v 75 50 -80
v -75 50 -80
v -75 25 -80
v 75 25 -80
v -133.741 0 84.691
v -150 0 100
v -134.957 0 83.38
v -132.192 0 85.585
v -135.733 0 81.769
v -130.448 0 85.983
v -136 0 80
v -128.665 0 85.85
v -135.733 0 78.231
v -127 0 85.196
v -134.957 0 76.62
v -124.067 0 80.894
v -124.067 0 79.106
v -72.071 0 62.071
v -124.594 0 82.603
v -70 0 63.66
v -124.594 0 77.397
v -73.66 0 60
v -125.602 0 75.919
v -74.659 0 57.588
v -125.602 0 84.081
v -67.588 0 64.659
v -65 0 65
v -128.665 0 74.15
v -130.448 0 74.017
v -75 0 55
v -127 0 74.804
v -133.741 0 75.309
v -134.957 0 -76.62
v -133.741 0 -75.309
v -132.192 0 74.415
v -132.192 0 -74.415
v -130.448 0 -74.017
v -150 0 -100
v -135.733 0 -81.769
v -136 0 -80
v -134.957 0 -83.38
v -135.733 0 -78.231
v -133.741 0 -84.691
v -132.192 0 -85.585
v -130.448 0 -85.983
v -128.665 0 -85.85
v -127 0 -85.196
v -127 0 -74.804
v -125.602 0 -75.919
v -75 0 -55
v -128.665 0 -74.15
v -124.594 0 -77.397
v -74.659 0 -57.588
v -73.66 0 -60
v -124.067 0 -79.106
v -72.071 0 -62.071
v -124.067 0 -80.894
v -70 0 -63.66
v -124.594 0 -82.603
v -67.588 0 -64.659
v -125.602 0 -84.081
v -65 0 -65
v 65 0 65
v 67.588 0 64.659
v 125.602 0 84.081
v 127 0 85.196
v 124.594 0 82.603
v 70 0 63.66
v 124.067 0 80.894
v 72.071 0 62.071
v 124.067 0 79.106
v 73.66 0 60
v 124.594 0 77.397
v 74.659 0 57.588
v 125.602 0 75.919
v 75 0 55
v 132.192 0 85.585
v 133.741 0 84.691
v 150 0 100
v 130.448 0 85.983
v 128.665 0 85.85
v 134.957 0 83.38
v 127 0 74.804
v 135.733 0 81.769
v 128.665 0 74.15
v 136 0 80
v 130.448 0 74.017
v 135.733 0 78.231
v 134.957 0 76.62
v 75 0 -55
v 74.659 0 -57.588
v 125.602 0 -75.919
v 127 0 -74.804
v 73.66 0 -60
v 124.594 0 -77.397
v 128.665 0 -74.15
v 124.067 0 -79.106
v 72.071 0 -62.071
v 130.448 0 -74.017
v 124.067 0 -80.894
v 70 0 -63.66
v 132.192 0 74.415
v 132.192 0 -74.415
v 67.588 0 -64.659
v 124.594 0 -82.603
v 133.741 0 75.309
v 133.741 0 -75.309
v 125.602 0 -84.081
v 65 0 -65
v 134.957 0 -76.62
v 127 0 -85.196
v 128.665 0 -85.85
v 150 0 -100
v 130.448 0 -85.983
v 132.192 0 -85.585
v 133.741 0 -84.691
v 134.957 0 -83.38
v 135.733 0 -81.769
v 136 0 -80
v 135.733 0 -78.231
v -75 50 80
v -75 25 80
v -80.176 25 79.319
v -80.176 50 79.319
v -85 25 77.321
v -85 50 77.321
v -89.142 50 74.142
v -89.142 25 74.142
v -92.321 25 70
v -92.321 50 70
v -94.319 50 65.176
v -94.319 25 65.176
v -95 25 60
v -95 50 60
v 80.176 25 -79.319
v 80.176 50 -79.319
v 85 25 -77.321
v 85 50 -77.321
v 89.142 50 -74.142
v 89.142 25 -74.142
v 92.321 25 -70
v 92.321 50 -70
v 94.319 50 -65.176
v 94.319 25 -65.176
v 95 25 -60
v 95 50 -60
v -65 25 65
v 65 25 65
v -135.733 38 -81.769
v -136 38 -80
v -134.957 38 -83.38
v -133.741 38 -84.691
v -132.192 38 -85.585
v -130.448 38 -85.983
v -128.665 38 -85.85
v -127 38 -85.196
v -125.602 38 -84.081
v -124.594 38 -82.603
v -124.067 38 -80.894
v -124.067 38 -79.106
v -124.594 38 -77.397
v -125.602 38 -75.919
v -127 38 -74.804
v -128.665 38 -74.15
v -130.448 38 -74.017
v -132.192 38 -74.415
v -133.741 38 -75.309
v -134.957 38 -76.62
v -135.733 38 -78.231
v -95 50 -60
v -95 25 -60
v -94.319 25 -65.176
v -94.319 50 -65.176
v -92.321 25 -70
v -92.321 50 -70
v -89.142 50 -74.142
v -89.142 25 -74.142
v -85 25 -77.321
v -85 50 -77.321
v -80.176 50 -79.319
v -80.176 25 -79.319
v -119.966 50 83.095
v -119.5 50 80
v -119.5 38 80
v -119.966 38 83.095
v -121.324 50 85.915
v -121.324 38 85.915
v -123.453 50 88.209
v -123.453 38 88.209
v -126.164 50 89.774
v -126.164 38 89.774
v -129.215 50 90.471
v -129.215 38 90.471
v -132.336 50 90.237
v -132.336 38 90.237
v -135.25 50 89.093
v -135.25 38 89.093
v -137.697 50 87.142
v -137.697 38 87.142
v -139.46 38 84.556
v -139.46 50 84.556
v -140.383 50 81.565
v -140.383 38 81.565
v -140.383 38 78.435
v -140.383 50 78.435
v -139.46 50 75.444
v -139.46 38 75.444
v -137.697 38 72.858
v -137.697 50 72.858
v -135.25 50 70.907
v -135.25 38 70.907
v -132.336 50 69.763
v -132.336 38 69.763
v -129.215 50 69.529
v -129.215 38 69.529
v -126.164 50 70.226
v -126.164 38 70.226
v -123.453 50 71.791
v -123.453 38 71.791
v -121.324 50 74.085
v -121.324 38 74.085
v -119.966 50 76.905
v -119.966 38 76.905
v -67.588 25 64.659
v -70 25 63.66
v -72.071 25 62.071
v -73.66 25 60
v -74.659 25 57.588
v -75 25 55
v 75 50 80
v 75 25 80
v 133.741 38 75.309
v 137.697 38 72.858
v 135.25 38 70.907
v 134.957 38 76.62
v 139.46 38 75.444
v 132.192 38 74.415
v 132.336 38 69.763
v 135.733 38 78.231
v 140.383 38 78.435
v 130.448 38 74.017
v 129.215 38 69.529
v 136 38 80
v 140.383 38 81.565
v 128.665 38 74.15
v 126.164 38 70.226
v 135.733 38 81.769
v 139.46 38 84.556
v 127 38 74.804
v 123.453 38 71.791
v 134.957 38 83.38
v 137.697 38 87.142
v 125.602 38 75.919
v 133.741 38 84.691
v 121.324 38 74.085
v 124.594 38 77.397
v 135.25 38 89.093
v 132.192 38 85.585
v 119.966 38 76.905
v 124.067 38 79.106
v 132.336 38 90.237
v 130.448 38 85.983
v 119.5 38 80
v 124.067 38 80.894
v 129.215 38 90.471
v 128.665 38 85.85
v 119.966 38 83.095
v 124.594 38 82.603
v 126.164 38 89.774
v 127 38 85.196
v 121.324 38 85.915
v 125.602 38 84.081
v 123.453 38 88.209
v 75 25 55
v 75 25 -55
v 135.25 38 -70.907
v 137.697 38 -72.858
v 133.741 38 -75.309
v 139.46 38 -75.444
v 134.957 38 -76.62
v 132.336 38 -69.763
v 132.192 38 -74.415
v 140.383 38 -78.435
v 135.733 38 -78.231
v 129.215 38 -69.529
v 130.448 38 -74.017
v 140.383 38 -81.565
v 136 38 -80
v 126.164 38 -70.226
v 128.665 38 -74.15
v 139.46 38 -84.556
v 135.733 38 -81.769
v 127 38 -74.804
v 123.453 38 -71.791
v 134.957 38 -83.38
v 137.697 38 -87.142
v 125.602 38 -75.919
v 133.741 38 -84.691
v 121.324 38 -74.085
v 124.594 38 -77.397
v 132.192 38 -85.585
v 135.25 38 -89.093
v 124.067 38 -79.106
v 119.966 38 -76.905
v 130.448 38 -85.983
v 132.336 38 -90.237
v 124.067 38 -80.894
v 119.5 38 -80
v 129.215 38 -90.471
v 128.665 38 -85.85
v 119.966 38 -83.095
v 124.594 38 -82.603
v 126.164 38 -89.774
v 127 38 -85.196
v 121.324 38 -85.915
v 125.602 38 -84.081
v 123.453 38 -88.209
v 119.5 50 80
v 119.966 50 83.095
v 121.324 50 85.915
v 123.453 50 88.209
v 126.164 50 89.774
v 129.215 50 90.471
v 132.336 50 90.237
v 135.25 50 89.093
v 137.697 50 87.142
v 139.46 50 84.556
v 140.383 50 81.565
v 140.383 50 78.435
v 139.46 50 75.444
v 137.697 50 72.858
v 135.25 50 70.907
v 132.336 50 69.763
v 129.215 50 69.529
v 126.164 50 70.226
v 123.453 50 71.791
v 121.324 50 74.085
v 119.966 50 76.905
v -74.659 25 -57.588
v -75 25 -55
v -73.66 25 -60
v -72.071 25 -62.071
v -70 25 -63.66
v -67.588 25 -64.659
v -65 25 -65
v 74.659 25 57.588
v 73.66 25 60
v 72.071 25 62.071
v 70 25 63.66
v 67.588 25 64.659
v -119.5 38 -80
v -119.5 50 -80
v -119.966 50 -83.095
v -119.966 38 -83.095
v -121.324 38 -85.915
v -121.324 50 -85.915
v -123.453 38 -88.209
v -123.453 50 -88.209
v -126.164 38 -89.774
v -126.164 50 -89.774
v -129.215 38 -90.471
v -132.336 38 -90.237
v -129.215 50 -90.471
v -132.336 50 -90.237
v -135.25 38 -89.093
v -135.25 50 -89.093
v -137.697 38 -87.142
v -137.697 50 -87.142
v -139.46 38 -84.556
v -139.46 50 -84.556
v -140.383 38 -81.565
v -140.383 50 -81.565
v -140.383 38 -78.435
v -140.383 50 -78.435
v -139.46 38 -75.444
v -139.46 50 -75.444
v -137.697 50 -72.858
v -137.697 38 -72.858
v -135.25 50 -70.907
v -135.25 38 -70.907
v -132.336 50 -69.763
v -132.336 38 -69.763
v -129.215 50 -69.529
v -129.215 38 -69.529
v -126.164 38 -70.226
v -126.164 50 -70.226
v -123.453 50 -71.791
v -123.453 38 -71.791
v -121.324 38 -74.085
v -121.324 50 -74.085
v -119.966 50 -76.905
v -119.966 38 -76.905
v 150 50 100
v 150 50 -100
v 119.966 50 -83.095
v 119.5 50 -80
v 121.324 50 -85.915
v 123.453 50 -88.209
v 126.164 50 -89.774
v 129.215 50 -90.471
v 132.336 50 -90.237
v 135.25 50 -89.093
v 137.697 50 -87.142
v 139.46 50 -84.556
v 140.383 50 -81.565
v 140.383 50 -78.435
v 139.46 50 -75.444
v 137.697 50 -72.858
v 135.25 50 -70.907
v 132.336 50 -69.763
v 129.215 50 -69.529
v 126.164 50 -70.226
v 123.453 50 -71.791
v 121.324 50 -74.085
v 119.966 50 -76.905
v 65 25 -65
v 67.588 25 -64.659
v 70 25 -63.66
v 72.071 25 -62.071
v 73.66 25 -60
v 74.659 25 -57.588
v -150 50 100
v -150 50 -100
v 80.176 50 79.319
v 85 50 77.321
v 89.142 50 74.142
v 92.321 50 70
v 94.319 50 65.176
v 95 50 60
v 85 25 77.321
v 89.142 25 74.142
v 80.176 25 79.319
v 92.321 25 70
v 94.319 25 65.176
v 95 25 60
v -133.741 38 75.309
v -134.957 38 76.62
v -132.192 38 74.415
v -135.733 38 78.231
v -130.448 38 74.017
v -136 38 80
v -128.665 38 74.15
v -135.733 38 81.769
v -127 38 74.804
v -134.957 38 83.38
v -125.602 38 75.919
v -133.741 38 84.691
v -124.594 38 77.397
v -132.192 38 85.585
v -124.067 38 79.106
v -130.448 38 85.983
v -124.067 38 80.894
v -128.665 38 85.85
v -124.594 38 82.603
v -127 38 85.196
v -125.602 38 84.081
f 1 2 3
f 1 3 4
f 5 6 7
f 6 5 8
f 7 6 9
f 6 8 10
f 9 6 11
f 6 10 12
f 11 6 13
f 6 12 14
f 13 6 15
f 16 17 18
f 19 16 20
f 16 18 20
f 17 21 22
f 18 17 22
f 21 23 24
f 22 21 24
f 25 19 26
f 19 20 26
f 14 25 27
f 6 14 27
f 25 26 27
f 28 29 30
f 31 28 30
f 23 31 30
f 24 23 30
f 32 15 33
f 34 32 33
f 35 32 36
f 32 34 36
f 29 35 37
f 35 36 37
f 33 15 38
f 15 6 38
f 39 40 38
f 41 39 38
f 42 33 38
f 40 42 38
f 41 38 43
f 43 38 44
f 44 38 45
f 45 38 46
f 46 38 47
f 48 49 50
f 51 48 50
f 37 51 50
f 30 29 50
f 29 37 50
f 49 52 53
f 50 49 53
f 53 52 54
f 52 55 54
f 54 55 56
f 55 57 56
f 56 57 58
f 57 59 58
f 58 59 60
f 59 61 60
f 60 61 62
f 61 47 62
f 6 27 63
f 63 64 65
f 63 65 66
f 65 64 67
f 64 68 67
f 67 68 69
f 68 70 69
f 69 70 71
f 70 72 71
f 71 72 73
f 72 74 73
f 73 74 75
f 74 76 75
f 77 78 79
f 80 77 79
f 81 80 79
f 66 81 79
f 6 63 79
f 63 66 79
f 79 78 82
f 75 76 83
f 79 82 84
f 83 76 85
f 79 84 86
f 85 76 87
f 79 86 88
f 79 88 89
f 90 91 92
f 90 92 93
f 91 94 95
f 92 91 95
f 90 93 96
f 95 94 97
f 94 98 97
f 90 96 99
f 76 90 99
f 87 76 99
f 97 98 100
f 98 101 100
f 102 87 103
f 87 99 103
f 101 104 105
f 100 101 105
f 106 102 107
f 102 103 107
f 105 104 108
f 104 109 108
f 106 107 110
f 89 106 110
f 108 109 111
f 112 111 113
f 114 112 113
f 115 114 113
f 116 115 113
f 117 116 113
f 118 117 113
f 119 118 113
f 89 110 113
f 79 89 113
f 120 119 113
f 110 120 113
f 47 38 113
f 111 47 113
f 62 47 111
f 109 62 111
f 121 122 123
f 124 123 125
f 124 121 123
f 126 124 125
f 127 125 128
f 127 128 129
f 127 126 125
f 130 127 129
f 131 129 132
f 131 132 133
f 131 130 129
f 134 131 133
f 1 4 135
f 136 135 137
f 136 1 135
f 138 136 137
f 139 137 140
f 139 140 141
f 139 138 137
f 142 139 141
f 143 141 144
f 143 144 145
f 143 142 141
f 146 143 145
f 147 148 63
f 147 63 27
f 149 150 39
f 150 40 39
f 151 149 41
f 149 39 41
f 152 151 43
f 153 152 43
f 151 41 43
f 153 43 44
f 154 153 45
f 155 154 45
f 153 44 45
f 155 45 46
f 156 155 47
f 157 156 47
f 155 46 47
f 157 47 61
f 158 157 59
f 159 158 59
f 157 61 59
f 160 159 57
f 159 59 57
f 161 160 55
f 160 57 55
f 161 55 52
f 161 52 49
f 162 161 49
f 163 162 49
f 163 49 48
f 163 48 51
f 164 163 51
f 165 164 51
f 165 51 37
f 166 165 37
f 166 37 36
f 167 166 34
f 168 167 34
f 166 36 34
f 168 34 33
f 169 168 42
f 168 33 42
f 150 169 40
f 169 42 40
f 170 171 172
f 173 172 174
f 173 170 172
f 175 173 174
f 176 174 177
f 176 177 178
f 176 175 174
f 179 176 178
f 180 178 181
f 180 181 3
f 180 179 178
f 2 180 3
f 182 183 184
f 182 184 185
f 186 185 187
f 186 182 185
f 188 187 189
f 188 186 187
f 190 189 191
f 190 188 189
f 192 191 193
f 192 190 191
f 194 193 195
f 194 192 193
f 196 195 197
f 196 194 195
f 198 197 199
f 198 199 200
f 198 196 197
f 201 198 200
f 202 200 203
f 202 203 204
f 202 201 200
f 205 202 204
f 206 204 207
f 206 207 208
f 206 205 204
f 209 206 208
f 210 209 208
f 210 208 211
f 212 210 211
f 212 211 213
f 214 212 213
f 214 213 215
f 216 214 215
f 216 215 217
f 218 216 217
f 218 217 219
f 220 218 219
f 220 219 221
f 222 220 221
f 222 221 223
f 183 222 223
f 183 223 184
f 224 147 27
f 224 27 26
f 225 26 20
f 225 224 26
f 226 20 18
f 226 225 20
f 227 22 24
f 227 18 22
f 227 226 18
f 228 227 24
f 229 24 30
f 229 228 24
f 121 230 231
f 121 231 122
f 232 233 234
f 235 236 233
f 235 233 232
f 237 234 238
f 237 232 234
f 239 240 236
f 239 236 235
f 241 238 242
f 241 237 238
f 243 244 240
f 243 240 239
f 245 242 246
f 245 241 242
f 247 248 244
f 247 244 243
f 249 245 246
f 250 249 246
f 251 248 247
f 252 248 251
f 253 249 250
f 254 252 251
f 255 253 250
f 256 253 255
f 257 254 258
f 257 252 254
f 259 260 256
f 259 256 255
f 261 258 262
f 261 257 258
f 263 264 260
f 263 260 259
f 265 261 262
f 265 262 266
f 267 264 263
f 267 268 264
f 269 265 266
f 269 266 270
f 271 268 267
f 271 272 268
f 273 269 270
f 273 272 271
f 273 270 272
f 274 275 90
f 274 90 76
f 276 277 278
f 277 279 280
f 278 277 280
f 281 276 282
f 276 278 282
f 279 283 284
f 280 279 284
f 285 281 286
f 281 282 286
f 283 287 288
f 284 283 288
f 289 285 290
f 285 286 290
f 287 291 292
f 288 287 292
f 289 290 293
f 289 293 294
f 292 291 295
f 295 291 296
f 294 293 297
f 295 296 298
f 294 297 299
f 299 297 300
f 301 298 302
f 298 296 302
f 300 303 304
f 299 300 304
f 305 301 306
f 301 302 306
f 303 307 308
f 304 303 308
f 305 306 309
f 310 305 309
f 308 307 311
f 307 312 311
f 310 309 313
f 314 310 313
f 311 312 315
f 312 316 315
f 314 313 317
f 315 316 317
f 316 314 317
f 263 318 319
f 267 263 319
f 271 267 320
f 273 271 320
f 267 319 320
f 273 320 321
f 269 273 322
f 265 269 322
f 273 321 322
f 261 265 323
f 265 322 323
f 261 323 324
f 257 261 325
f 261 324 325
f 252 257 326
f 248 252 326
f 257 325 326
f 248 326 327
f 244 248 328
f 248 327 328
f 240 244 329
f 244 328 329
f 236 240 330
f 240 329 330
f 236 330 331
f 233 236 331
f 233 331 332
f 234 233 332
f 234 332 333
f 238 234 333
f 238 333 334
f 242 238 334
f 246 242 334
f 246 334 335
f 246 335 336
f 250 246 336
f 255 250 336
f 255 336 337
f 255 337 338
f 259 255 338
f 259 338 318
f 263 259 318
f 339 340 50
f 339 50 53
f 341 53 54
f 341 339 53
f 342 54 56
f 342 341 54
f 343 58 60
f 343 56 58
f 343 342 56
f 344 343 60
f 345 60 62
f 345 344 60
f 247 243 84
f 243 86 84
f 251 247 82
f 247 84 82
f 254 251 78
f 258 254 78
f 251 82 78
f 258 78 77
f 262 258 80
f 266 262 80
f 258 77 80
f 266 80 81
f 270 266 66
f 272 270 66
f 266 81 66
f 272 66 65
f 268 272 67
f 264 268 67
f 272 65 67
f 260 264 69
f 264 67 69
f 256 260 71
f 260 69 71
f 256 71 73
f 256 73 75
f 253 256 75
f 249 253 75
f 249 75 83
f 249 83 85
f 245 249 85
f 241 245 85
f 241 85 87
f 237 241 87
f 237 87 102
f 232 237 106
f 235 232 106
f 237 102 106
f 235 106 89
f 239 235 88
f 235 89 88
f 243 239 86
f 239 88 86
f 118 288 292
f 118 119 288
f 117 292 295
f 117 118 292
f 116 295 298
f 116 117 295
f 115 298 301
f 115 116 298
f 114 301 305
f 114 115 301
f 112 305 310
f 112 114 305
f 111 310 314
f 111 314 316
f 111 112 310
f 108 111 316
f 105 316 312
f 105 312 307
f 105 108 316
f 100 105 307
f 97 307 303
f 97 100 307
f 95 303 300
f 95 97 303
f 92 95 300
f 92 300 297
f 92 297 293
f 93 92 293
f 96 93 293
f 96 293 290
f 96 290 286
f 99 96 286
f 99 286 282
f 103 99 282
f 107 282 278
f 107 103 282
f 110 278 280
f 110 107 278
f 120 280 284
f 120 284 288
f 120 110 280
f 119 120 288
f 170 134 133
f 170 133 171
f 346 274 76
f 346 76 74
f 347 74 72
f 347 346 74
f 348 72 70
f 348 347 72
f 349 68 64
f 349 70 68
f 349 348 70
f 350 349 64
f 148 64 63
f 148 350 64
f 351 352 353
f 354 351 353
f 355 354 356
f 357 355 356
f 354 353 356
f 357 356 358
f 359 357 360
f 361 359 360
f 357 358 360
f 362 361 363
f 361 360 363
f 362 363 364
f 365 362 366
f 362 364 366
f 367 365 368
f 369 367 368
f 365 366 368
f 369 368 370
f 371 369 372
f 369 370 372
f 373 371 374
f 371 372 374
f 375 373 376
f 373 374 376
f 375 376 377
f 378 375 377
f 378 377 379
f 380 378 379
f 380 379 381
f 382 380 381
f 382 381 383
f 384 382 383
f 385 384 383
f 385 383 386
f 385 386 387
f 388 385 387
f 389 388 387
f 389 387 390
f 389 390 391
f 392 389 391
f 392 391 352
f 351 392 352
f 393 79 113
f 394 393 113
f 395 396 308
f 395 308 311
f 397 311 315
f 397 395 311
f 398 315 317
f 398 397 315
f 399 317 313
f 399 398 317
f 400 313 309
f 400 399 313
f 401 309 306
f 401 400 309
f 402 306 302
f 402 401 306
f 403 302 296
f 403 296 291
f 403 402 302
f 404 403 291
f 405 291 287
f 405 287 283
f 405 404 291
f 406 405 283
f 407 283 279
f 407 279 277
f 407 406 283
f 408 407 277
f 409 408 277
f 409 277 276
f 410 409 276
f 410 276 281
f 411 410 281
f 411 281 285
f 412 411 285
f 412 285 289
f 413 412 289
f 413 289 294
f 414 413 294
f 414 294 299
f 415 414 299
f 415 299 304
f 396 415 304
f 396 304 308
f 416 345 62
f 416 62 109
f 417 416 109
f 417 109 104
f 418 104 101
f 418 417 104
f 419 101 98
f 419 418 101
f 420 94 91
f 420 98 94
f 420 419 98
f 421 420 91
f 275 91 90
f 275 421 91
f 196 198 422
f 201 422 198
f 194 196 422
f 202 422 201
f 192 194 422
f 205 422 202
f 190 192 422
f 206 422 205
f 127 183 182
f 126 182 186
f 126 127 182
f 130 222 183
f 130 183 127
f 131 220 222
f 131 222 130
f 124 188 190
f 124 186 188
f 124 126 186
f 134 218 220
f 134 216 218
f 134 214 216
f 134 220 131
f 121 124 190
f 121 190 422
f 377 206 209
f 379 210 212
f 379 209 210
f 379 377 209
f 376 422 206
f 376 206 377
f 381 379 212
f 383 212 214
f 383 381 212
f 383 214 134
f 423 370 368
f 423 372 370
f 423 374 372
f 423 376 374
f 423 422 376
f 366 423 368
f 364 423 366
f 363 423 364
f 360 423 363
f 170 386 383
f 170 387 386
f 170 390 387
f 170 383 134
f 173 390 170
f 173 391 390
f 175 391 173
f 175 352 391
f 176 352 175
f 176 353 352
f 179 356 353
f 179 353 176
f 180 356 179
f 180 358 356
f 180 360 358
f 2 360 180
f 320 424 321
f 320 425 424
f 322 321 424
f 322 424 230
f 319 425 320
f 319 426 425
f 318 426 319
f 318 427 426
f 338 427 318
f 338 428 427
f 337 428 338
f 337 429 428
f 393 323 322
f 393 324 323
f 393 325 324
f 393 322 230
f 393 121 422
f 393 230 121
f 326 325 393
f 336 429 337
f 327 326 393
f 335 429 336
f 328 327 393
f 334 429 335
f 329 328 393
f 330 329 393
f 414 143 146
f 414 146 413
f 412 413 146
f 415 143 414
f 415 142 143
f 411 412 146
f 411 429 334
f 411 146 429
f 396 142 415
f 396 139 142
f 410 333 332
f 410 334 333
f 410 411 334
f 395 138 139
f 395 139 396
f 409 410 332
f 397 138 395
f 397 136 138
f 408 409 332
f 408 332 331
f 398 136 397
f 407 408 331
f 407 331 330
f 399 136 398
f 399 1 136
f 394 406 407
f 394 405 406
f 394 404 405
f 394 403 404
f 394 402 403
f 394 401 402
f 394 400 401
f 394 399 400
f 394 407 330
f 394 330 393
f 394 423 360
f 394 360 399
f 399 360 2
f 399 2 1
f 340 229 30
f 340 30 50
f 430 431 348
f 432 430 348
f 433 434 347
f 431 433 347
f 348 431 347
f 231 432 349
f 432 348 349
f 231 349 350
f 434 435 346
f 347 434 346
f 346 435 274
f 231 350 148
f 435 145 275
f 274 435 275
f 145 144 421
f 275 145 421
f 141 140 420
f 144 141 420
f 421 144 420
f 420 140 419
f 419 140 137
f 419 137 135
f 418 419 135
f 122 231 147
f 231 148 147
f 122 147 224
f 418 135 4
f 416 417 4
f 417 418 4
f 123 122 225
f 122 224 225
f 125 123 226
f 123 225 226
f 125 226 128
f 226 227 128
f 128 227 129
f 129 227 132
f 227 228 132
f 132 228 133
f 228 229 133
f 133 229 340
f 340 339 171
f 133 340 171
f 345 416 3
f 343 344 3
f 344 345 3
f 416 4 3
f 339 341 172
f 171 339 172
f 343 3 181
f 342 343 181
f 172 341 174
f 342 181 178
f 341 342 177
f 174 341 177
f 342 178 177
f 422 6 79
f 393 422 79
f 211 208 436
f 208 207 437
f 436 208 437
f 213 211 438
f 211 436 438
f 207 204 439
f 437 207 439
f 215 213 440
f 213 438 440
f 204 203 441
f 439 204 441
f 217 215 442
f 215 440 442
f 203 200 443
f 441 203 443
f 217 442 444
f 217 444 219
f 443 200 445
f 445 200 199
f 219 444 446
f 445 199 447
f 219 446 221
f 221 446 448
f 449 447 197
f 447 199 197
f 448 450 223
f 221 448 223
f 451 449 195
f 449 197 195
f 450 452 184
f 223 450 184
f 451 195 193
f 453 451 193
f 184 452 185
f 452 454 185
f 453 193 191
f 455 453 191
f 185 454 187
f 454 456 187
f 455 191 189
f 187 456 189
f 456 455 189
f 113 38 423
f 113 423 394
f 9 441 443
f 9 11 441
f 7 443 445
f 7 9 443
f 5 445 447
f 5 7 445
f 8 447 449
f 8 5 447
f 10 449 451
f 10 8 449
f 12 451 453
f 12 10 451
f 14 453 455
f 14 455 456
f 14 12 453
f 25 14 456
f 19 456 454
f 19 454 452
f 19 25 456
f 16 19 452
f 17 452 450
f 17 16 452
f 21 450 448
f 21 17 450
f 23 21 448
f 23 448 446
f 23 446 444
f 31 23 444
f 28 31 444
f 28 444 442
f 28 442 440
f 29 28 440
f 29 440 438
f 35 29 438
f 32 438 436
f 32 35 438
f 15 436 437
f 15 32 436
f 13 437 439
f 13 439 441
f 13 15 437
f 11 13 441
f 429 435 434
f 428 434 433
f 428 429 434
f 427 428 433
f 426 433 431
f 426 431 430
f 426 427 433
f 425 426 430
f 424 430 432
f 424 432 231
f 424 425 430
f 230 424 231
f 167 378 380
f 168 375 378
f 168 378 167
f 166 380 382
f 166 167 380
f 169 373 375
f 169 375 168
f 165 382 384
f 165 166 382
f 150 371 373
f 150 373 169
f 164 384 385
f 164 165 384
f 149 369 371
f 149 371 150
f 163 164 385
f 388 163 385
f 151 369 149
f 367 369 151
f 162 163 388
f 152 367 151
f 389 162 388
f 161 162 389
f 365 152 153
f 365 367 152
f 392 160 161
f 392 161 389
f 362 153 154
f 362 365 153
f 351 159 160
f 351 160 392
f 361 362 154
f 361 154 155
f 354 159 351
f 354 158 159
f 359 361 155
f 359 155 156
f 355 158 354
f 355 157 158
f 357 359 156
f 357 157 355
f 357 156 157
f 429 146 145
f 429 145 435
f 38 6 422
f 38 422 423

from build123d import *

# Parameters (mm, degrees)
CROQUIS1_W                   = 300
CROQUIS1_H                   = 200
SALIENTE_EXTRUIR1_DEPTH      = 50
TALADRO1_D                   = 12
TALADRO1_DEPTH               = 50.801082666
TALADRO1_CBORE_D             = 21
TALADRO1_CBORE_DEPTH         = 12
SIMETR_A2_COPY_1_D           = 12
SIMETR_A2_COPY_1_DEPTH       = 50.801082666
SIMETR_A2_COPY_1_CBORE_D     = 21
SIMETR_A2_COPY_1_CBORE_DEPTH = 12
SIMETR_A2_COPY_2_D           = 12
SIMETR_A2_COPY_2_DEPTH       = 50.801082666
SIMETR_A2_COPY_2_CBORE_D     = 21
SIMETR_A2_COPY_2_CBORE_DEPTH = 12
CORTAR_EXTRUIR1_DEPTH        = 25
CORTAR_EXTRUIR2_DEPTH        = 51


with BuildPart() as part:
    # Croquis1 → Saliente-Extruir1 (new body)
    with BuildSketch(Plane(origin=(0, 0, 0), x_dir=(1, 0, 0), z_dir=(0, 1, 0))):
        Rectangle(CROQUIS1_W, CROQUIS1_H)
    extrude(amount=SALIENTE_EXTRUIR1_DEPTH)

    # Taladro1
    with Locations(Plane(origin=(0, 50, 0), x_dir=(1, 0, 0), z_dir=(0, 1, 0))):
        with Locations((-130, 80)):
            taladro1 = CounterBoreHole(TALADRO1_D / 2, TALADRO1_CBORE_D / 2, TALADRO1_CBORE_DEPTH, depth=TALADRO1_DEPTH)

    # Simetría1: Taladro1 across plane
    add(taladro1.mirror(Plane(origin=(0, 0, 0), x_dir=(0, 0, 1), z_dir=(1, 0, 0))), mode=Mode.SUBTRACT)

    # Simetría2 copy 1
    with Locations(Plane(origin=(0, 50, 0), x_dir=(-1, 0, 0), z_dir=(0, 1, 0))):
        with Locations((-130, 80)):
            CounterBoreHole(SIMETR_A2_COPY_1_D / 2, SIMETR_A2_COPY_1_CBORE_D / 2, SIMETR_A2_COPY_1_CBORE_DEPTH, depth=SIMETR_A2_COPY_1_DEPTH)

    # Simetría2 copy 2
    with Locations(Plane(origin=(0, 50, 0), x_dir=(1, 0, 0), z_dir=(0, 1, 0))):
        with Locations((-130, -80)):
            CounterBoreHole(SIMETR_A2_COPY_2_D / 2, SIMETR_A2_COPY_2_CBORE_D / 2, SIMETR_A2_COPY_2_CBORE_DEPTH, depth=SIMETR_A2_COPY_2_DEPTH)

    # Croquis4 → Cortar-Extruir1 (cut)
    with BuildSketch(Plane(origin=(0, 50, 0), x_dir=(1, 0, 0), z_dir=(0, 1, 0))):
        with BuildLine():
            Line((-75, 80), (75, 80))
            ThreePointArc((75, 80), (89.142135624, 74.142135624), (95, 60))
            Line((95, 60), (95, -60))
            ThreePointArc((95, -60), (89.142135624, -74.142135624), (75, -80))
            Line((75, -80), (-75, -80))
            ThreePointArc((-75, -80), (-89.142135624, -74.142135624), (-95, -60))
            Line((-95, -60), (-95, 60))
            ThreePointArc((-95, 60), (-89.142135624, 74.142135624), (-75, 80))
        make_face()
        with BuildLine():
            Line((-65, 65), (65, 65))
            ThreePointArc((65, 65), (72.071067812, 62.071067812), (75, 55))
            Line((75, 55), (75, -55))
            ThreePointArc((75, -55), (72.071067812, -62.071067812), (65, -65))
            Line((65, -65), (-65, -65))
            ThreePointArc((-65, -65), (-72.071067812, -62.071067812), (-75, -55))
            Line((-75, -55), (-75, 55))
            ThreePointArc((-75, 55), (-72.071067812, 62.071067812), (-65, 65))
        make_face(mode=Mode.SUBTRACT)
    extrude(amount=-CORTAR_EXTRUIR1_DEPTH, mode=Mode.SUBTRACT)

    # Croquis4<2> → Cortar-Extruir2 (cut)
    with BuildSketch(Plane(origin=(0, 50, 0), x_dir=(1, 0, 0), z_dir=(0, 1, 0))):
        with BuildLine():
            Line((65, 65), (-65, 65))
            ThreePointArc((-65, 65), (-72.071067812, 62.071067812), (-75, 55))
            Line((-75, 55), (-75, -55))
            ThreePointArc((-75, -55), (-72.071067812, -62.071067812), (-65, -65))
            Line((-65, -65), (65, -65))
            ThreePointArc((65, -65), (72.071067812, -62.071067812), (75, -55))
            Line((75, -55), (75, 55))
            ThreePointArc((75, 55), (72.071067812, 62.071067812), (65, 65))
        make_face()
    extrude(amount=-CORTAR_EXTRUIR2_DEPTH, mode=Mode.SUBTRACT)


solid = part.part
